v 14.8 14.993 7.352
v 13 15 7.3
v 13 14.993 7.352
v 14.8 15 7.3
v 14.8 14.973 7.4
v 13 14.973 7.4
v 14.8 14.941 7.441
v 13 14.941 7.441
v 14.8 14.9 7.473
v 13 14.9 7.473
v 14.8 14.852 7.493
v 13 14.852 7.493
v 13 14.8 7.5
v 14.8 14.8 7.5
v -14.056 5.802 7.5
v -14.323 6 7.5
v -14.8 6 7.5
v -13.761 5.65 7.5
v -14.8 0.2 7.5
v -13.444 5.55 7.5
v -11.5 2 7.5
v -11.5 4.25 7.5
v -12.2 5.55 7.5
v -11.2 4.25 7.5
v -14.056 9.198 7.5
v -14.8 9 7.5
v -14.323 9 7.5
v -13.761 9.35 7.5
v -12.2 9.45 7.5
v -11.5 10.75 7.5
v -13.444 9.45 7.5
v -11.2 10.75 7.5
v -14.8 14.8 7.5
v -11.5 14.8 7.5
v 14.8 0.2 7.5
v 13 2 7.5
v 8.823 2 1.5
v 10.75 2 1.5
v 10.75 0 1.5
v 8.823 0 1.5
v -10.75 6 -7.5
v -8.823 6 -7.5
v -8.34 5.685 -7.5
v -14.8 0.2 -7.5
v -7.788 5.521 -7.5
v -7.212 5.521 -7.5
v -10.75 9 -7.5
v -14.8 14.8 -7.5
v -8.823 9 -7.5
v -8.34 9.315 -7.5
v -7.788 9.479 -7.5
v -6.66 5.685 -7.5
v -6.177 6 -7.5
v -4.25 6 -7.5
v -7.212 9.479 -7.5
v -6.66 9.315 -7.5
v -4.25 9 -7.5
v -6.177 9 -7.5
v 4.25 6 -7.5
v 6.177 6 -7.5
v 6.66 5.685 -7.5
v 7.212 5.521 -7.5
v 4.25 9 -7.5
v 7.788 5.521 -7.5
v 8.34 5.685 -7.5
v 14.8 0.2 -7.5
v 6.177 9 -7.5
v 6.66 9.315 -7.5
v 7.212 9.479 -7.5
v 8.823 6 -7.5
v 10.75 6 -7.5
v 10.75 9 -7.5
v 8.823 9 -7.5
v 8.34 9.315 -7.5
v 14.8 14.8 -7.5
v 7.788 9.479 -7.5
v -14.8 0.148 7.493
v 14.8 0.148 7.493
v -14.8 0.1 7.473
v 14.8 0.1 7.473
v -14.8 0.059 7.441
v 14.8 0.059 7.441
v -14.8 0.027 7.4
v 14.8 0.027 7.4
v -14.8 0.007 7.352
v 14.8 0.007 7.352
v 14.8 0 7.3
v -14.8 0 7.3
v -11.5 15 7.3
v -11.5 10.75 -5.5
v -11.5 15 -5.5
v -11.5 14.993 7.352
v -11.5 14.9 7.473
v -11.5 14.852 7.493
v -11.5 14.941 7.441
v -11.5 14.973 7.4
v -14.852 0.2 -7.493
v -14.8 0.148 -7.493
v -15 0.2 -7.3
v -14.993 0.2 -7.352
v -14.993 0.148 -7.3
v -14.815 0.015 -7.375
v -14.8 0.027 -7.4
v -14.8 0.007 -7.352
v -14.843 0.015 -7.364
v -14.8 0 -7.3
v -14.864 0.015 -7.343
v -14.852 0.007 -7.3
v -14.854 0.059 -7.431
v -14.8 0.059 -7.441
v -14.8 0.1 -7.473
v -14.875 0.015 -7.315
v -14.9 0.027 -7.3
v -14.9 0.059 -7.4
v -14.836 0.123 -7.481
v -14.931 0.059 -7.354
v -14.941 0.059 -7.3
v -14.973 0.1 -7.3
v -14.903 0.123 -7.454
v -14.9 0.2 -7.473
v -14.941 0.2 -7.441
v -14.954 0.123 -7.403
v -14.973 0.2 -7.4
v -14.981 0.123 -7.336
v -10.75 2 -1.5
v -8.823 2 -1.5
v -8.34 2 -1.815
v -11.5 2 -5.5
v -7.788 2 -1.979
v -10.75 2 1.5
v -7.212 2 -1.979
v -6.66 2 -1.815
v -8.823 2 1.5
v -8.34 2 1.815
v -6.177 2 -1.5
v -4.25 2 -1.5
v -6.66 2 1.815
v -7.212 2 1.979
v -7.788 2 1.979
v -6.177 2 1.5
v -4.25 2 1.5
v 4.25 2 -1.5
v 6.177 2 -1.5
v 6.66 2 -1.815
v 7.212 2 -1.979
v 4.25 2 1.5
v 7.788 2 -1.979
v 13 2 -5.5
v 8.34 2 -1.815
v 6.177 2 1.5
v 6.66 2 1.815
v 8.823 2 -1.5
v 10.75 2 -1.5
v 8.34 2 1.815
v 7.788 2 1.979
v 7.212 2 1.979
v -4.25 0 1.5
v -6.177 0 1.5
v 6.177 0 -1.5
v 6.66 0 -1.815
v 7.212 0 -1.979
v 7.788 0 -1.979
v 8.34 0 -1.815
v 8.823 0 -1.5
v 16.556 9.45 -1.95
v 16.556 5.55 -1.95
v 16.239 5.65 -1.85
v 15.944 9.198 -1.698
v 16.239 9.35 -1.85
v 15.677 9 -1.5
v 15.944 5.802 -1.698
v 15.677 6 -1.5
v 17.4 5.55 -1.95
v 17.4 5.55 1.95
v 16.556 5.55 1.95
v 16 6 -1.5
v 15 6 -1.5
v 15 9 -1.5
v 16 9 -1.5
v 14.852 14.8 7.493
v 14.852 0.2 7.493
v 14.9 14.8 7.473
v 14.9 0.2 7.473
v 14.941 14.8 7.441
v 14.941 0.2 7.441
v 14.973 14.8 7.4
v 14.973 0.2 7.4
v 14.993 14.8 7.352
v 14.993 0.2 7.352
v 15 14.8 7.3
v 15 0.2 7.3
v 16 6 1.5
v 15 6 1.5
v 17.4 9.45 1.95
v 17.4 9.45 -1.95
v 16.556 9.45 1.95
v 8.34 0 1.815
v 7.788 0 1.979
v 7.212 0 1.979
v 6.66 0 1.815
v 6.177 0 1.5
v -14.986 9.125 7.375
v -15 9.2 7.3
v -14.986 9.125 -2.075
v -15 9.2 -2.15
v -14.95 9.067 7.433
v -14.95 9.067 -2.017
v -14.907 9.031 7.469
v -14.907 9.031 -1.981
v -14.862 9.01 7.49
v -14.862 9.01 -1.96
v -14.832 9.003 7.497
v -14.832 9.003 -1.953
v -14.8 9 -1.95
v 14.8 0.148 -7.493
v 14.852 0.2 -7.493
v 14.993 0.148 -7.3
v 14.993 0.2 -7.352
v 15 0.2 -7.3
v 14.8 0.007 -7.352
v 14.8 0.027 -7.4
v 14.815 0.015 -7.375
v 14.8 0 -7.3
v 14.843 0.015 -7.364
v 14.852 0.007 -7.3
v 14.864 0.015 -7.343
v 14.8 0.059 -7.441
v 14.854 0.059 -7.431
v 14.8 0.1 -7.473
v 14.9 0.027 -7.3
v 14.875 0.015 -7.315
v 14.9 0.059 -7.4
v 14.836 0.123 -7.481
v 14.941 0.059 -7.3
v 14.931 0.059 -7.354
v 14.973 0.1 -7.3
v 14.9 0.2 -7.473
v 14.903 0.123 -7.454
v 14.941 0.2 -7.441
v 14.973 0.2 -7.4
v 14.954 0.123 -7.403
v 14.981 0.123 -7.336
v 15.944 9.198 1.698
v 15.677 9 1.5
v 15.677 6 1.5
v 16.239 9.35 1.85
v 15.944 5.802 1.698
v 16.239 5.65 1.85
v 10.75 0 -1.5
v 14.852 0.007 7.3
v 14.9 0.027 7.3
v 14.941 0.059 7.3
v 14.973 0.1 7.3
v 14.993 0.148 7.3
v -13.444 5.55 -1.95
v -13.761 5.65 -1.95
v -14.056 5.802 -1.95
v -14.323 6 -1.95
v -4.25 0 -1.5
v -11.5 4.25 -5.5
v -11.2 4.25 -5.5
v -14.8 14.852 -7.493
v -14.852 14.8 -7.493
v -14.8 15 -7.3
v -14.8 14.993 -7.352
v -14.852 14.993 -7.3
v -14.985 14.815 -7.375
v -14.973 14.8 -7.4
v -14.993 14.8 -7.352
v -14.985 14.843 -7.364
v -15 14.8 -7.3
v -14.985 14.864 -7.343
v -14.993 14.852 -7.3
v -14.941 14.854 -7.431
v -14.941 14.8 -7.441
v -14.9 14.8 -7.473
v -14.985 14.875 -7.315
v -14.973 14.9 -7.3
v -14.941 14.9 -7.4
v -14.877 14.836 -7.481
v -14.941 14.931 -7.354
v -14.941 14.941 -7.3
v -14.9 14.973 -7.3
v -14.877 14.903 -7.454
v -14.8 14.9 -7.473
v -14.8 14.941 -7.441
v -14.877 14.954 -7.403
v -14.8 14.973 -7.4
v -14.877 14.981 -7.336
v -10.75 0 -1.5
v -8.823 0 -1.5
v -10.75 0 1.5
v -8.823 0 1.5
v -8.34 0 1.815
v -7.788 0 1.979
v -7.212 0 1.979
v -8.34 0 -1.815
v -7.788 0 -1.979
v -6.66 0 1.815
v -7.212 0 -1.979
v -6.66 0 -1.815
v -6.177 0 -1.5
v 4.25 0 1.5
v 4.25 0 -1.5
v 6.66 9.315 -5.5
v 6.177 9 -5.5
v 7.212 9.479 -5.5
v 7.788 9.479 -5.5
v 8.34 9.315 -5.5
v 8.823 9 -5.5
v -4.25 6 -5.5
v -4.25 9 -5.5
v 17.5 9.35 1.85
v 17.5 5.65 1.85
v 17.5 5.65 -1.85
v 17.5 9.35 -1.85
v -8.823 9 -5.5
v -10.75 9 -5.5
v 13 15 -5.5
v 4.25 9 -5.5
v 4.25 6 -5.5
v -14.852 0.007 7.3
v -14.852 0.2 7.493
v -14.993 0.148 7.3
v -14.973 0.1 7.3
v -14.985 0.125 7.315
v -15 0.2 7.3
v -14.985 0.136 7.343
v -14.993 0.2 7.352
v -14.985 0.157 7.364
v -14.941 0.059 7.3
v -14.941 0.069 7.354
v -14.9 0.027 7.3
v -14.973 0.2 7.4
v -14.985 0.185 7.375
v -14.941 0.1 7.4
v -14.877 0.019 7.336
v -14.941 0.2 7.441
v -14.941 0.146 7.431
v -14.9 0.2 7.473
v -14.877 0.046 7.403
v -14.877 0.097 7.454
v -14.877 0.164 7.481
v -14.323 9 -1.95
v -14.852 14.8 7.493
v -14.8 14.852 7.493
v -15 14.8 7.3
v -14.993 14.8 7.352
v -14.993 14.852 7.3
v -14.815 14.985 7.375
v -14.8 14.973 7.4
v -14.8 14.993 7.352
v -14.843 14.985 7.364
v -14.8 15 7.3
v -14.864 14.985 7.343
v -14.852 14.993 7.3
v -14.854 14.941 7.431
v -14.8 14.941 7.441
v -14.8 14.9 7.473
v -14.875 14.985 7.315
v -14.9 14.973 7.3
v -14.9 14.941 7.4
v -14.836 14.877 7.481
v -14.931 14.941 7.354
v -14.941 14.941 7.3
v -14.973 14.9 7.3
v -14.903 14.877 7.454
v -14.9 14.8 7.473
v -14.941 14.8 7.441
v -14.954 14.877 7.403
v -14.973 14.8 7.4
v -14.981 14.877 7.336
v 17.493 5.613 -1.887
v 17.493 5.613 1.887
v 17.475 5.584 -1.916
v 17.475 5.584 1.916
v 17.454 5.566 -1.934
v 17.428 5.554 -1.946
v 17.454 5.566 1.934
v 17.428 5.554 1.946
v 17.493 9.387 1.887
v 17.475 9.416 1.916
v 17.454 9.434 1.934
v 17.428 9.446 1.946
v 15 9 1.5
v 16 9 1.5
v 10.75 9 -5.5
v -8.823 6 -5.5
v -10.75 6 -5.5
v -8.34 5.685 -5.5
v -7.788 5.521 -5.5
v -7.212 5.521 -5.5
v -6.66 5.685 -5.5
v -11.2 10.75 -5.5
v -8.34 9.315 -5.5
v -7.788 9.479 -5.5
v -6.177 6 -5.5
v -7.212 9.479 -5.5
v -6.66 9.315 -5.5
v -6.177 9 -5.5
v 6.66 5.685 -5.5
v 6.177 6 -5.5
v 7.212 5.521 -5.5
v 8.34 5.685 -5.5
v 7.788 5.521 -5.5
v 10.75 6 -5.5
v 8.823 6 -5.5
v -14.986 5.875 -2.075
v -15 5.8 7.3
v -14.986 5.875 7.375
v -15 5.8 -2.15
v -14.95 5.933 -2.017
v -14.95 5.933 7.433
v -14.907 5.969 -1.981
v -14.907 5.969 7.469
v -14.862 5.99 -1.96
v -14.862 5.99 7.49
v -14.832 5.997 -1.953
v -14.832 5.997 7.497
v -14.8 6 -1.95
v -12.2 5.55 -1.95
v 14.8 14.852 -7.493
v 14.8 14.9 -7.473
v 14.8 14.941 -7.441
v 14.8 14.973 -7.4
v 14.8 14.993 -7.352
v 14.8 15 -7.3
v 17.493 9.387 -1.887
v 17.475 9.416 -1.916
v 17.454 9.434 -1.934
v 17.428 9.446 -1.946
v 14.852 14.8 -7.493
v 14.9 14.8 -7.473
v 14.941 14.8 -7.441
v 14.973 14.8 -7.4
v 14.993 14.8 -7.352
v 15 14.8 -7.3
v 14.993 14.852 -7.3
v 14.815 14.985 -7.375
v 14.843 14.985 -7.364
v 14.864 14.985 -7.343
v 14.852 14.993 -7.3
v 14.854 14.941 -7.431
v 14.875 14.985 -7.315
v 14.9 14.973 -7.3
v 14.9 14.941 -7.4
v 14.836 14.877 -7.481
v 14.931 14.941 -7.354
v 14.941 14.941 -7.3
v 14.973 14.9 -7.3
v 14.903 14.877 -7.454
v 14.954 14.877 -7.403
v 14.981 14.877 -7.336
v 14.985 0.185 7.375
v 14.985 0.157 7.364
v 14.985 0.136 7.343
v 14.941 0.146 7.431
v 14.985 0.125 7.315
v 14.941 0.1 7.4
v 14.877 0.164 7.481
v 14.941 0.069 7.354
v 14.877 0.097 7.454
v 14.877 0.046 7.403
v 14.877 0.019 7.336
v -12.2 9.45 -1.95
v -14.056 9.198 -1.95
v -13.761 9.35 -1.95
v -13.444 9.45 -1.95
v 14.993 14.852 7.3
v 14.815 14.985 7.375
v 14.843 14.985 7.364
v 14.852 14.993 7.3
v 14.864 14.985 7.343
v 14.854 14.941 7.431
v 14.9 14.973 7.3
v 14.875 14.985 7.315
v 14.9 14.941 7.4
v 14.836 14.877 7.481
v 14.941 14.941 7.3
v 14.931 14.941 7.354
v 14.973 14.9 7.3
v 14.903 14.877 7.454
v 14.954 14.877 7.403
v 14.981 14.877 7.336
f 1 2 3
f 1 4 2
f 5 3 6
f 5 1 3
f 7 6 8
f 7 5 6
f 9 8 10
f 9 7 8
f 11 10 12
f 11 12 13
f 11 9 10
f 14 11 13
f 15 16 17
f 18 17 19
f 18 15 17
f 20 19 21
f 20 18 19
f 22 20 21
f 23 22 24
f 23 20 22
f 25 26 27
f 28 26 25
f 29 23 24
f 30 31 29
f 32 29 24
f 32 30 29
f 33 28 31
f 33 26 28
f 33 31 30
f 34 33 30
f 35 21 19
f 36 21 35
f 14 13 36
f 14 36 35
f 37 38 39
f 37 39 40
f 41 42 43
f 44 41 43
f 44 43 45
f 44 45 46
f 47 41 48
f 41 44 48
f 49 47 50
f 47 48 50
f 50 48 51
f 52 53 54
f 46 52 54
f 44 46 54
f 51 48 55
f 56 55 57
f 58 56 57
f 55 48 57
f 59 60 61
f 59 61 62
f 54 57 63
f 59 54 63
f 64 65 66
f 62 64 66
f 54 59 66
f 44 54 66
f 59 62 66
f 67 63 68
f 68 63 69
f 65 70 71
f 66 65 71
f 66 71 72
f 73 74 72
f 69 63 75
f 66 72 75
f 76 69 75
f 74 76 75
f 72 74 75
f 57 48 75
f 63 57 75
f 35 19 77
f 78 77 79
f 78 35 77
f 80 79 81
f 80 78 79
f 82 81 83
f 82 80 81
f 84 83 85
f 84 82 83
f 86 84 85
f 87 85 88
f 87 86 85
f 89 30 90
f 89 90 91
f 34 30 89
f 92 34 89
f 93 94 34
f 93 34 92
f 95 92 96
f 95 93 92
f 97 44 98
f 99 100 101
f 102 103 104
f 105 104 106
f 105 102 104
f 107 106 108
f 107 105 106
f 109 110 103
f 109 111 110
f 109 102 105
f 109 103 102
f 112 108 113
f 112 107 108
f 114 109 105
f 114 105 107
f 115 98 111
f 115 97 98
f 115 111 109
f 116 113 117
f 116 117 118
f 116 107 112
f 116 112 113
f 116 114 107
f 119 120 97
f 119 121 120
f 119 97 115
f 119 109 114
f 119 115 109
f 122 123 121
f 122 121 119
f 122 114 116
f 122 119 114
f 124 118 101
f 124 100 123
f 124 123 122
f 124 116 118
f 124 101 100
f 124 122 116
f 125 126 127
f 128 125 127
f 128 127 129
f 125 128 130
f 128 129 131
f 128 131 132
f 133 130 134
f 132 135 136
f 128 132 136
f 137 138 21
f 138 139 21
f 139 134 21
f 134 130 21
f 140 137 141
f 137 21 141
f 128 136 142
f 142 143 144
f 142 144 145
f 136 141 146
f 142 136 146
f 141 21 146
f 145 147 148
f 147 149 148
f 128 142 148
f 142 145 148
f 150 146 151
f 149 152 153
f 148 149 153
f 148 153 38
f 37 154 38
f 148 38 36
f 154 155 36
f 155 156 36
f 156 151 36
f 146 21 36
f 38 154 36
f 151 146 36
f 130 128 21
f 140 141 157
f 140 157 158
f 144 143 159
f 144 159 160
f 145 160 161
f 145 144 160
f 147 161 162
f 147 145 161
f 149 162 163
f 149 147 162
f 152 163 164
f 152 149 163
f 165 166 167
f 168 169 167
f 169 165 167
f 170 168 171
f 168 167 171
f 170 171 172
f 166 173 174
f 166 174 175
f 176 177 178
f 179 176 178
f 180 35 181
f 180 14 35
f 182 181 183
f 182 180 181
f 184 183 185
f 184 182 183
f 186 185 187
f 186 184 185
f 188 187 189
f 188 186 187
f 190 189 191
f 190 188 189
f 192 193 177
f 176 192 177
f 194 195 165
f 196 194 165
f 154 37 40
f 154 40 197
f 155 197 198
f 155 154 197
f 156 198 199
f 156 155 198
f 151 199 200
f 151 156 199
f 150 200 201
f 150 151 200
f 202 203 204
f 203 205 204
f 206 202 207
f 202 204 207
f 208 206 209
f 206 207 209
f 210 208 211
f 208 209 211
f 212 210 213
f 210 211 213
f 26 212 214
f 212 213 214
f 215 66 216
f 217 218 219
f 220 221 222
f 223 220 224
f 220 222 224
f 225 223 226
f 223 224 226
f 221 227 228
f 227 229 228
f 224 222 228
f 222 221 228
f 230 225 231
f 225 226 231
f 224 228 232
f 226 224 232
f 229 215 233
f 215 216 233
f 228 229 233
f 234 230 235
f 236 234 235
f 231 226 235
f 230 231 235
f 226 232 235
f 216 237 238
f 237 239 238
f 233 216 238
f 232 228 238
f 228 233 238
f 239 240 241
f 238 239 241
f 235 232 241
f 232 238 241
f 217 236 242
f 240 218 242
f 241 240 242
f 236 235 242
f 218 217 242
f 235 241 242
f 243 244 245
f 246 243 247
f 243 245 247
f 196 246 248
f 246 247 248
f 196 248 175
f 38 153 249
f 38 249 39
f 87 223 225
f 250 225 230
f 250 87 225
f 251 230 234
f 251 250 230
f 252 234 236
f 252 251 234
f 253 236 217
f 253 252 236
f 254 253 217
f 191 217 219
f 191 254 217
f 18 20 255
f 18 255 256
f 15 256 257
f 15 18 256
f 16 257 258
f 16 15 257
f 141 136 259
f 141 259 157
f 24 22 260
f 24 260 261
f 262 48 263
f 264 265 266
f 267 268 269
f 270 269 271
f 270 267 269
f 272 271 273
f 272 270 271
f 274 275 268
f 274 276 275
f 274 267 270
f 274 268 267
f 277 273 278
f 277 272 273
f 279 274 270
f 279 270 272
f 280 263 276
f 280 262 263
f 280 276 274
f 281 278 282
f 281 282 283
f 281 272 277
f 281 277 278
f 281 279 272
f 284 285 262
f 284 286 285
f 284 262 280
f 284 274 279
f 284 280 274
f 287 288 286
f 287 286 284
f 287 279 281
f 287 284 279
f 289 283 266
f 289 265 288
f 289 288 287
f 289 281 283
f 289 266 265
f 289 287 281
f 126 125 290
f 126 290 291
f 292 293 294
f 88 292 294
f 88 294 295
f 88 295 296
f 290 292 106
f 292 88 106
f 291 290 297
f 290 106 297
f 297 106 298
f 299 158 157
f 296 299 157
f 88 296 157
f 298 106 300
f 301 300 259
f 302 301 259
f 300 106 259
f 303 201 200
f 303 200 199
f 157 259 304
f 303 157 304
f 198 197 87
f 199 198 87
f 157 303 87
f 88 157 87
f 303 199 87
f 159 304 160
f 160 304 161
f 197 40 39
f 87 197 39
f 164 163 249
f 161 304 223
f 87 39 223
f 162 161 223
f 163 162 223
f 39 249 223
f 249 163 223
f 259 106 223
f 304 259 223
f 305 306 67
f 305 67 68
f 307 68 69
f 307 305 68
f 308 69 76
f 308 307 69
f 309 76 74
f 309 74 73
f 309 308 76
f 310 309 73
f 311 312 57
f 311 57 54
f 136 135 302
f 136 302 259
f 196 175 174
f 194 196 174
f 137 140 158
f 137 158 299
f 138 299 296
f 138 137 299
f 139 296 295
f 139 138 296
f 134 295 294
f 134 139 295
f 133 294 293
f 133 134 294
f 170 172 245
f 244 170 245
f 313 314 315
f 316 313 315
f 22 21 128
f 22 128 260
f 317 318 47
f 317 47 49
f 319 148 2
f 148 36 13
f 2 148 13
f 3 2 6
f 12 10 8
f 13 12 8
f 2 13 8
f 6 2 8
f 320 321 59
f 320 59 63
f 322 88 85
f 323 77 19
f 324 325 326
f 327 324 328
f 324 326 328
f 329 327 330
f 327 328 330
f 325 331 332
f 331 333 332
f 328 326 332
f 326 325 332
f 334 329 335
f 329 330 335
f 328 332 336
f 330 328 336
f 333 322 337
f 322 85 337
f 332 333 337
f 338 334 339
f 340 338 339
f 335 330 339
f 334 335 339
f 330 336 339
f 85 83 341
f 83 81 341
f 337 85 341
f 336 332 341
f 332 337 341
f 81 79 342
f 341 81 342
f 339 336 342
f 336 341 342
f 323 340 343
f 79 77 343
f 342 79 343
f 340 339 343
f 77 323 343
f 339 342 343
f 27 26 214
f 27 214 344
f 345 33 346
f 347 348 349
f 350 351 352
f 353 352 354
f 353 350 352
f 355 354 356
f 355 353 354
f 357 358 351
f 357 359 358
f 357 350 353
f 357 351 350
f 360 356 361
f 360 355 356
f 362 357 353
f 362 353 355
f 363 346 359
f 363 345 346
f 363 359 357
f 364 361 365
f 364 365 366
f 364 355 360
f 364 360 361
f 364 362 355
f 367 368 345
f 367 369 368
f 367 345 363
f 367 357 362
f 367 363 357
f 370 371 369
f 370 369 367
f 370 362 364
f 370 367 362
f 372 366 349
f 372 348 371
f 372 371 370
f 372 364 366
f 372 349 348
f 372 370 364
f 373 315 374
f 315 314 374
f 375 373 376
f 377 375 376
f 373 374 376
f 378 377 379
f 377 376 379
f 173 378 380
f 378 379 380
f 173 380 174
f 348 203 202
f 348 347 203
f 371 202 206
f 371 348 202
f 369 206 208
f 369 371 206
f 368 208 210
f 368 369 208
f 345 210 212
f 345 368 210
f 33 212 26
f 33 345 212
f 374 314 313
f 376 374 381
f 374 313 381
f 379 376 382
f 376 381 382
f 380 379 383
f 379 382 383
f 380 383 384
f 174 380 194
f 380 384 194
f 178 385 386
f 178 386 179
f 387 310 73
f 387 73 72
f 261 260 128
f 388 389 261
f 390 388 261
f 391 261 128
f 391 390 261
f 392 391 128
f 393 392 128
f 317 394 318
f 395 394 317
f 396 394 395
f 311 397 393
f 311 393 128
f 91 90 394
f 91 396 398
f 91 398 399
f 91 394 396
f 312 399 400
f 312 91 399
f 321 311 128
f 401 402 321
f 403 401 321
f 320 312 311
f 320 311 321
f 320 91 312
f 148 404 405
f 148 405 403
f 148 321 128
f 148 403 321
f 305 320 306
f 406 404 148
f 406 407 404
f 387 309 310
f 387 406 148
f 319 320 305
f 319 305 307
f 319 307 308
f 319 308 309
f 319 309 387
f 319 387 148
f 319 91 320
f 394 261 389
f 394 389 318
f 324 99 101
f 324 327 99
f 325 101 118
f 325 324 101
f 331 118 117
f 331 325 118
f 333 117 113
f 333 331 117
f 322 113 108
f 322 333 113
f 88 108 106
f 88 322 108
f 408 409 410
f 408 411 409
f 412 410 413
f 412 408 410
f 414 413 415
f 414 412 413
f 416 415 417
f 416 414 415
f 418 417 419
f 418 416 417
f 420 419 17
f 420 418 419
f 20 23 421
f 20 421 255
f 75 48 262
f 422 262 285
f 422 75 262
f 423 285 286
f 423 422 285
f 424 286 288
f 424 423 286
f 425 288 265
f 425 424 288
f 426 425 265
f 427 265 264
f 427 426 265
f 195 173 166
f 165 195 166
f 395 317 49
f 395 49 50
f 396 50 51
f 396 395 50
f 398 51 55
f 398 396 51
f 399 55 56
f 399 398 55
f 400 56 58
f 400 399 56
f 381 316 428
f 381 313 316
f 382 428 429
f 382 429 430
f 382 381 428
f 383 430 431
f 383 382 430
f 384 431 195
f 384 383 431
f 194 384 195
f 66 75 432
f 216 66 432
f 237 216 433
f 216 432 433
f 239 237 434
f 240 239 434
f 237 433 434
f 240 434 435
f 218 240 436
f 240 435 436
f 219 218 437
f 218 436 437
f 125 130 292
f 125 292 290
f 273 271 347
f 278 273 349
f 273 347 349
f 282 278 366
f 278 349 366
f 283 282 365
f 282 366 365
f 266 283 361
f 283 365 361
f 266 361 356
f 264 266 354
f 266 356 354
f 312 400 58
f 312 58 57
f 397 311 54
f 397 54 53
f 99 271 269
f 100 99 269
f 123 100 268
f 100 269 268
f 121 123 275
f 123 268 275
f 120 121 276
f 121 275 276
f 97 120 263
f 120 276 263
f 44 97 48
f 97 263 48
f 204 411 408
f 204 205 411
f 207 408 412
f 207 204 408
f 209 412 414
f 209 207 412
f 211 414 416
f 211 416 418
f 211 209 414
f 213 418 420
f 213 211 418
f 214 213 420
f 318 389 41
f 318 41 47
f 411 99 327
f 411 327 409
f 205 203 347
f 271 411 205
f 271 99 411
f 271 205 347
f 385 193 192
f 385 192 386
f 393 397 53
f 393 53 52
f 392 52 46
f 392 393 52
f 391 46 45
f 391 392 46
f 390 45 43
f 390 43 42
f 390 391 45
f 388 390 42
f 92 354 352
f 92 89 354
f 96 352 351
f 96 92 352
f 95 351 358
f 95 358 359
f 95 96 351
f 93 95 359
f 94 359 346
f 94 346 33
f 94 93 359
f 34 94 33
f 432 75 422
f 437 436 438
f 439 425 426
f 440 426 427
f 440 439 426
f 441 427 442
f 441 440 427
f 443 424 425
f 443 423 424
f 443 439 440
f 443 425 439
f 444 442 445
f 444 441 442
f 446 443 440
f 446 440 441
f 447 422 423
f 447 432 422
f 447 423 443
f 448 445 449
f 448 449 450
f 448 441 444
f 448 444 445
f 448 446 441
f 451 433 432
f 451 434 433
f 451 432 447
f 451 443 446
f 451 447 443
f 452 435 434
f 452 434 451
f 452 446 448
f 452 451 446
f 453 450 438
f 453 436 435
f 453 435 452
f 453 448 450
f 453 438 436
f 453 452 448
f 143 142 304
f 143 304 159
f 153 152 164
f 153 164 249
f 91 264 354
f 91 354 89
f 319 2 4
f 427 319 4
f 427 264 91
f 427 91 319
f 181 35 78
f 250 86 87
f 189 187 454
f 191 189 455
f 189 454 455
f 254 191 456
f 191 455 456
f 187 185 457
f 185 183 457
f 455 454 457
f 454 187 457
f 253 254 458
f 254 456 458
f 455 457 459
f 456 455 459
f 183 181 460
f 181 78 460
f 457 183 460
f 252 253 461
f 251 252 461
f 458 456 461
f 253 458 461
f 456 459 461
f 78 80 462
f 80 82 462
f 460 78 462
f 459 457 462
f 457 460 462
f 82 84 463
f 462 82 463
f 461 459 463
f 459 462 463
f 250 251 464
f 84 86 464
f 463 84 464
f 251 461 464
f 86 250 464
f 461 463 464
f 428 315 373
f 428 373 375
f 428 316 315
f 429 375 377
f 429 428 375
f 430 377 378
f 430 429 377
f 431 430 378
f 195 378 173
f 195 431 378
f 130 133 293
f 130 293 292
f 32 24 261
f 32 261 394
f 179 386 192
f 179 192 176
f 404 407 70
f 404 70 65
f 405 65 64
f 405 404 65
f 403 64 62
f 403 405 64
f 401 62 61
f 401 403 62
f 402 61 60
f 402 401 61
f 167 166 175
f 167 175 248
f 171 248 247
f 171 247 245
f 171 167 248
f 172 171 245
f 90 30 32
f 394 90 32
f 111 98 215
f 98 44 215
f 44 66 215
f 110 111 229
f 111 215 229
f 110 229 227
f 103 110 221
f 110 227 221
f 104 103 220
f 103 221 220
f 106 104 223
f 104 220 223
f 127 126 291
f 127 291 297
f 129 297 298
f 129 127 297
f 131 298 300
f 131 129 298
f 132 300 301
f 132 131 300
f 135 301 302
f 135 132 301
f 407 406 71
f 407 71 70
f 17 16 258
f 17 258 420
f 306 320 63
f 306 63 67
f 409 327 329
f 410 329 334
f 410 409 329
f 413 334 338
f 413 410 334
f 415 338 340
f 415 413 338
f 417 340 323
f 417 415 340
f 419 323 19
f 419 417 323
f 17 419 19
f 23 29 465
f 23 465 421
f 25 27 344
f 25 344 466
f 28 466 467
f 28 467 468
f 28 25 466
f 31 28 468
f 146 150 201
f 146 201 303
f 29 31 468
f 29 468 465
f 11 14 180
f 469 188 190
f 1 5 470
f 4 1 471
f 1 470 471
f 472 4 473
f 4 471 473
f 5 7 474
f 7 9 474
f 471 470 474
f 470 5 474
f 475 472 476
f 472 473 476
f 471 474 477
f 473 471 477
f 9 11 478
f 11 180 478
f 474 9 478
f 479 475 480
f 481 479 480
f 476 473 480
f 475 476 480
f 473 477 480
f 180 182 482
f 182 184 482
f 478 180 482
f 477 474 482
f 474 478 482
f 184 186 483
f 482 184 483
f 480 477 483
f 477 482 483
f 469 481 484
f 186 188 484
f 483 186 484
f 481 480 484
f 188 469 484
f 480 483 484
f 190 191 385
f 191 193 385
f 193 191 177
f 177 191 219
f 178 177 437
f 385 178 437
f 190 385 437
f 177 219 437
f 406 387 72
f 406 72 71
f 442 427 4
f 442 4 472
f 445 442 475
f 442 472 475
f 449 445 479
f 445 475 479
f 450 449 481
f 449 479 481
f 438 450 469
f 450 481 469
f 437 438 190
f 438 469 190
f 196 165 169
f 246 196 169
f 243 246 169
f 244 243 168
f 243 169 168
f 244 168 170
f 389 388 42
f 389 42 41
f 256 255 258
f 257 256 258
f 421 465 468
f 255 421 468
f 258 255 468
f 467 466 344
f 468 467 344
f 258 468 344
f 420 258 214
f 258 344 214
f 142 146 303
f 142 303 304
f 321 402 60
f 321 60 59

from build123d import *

# Parameters (mm, degrees)
EXTRUDE_1_DEPTH      = 7.5
EXTRUDE_1_DEPTH_BACK = 7.5
SKETCH_1_W           = 30
SKETCH_1_H           = 15
SKETCH_2_W           = 24.5
SKETCH_2_H           = 13
CUT_EXTRUDE_1_DEPTH  = 13
SKETCH_3_W           = 3
SKETCH_3_H           = 3
EXTRUDE_2_DEPTH      = 1
EXTRUDE_3_DEPTH      = 4
EXTRUDE_3_DEPTH_BACK = 1
CUT_EXTRUDE_START    = -3.9
CUT_EXTRUDE_2_DEPTH  = 3.9
CUT_EXTRUDE_3_DEPTH  = 9.45
CUT_EXTRUDE_4_DEPTH  = 2
EXTRUDE_4_REACH      = 29.5
SKETCH_8_W           = 0.3
SKETCH_8_H           = 6.5
CUT_EXTRUDE_5_DEPTH  = 2
FILLET_1_R           = 0.1
FILLET_2_R           = 0.2


with BuildPart() as part:
    # 草图1 → 凸台-拉伸1 (new, two sides: drawn at the far end of the back side and taken through both)
    with BuildSketch(Plane.XY.offset(-EXTRUDE_1_DEPTH_BACK)):
        with Locations((0, 7.5)):
            Rectangle(SKETCH_1_W, SKETCH_1_H)
    extrude(amount=EXTRUDE_1_DEPTH + EXTRUDE_1_DEPTH_BACK)

    # 草图2 → 切除-拉伸1 (cut)
    with BuildSketch(Plane.XY.offset(7.5)):
        with Locations((0.75, 8.5)):
            Rectangle(SKETCH_2_W, SKETCH_2_H)
    extrude(amount=-CUT_EXTRUDE_1_DEPTH, mode=Mode.SUBTRACT)

    # 草图3 → 凸台-拉伸2 (add)
    with BuildSketch(Plane(origin=(15, 0, 0), x_dir=(0, 0, -1), z_dir=(1, 0, 0))):
        with Locations((0, 7.5)):
            Rectangle(SKETCH_3_W, SKETCH_3_H)
    extrude(amount=EXTRUDE_2_DEPTH)

    # 草图6 → 切除-拉伸3 (cut)
    with BuildSketch(Plane.XY.offset(7.5)):
        with BuildLine():
            Line((-15, 9), (-14.322875656, 9))
            ThreePointArc((-14.322875656, 9), (-13.911838473, 9.280042303), (-13.444409721, 9.45))
            Line((-13.444409721, 9.45), (-12.2, 9.45))
            Line((-12.2, 9.45), (-12.2, 5.55))
            Line((-12.2, 5.55), (-13.444409721, 5.55))
            ThreePointArc((-13.444409721, 5.55), (-13.911838473, 5.719957697), (-14.322875656, 6))
            Line((-14.322875656, 6), (-15, 6))
            Line((-15, 6), (-15, 9))
        make_face()
    extrude(amount=-CUT_EXTRUDE_3_DEPTH, mode=Mode.SUBTRACT)

    # 草图7 → 切除-拉伸4 (cut)
    with BuildSketch(Plane.XY.offset(-5.5)):
        with BuildLine():
            Line((-6.177124344, 9), (-4.25, 9))
            Line((-4.25, 9), (-4.25, 6))
            Line((-4.25, 6), (-6.177124344, 6))
            ThreePointArc((-6.177124344, 6), (-7.5, 5.5), (-8.822875656, 6))
            Line((-8.822875656, 6), (-10.75, 6))
            Line((-10.75, 6), (-10.75, 9))
            Line((-10.75, 9), (-8.822875656, 9))
            ThreePointArc((-8.822875656, 9), (-7.5, 9.5), (-6.177124344, 9))
        make_face()
        with BuildLine():
            Line((4.25, 9), (6.177124344, 9))
            ThreePointArc((6.177124344, 9), (7.5, 9.5), (8.822875656, 9))
            Line((8.822875656, 9), (10.75, 9))
            Line((10.75, 9), (10.75, 6))
            Line((10.75, 6), (8.822875656, 6))
            ThreePointArc((8.822875656, 6), (7.5, 5.5), (6.177124344, 6))
            Line((6.177124344, 6), (4.25, 6))
            Line((4.25, 6), (4.25, 9))
        make_face()
    extrude(amount=-CUT_EXTRUDE_4_DEPTH, mode=Mode.SUBTRACT)

    # 草图8 → 凸台-拉伸4 (add, up to next)
    with BuildSketch(Plane.XY.offset(7.5), mode=Mode.PRIVATE) as extrude_4_sk1:
        with Locations((-11.35, 7.5)):
            Rectangle(SKETCH_8_W, SKETCH_8_H)
    extrude_4_tool1 = extrude(extrude_4_sk1.sketch, amount=-EXTRUDE_4_REACH, mode=Mode.PRIVATE) - part.part
    add(extrude_4_tool1.solids().sort_by_distance((-11.35, 7.5, 7.5))[0])

    # 草图9 → 切除-拉伸5 (cut)
    with BuildSketch(Plane(origin=(0, 2, 0), x_dir=(-1, 0, 0), z_dir=(0, 1, 0))):
        with BuildLine():
            Line((6.177124344, -1.5), (4.25, -1.5))
            Line((4.25, -1.5), (4.25, 1.5))
            Line((4.25, 1.5), (6.177124344, 1.5))
            ThreePointArc((6.177124344, 1.5), (7.5, 2), (8.822875656, 1.5))
            Line((8.822875656, 1.5), (10.75, 1.5))
            Line((10.75, 1.5), (10.75, -1.5))
            Line((10.75, -1.5), (8.822875656, -1.5))
            ThreePointArc((8.822875656, -1.5), (7.5, -2), (6.177124344, -1.5))
        make_face()
        with BuildLine():
            Line((-4.25, -1.5), (-6.177124344, -1.5))
            ThreePointArc((-6.177124344, -1.5), (-7.5, -2), (-8.822875656, -1.5))
            Line((-8.822875656, -1.5), (-10.75, -1.5))
            Line((-10.75, -1.5), (-10.75, 1.5))
            Line((-10.75, 1.5), (-8.822875656, 1.5))
            ThreePointArc((-8.822875656, 1.5), (-7.5, 2), (-6.177124344, 1.5))
            Line((-6.177124344, 1.5), (-4.25, 1.5))
            Line((-4.25, 1.5), (-4.25, -1.5))
        make_face()
    extrude(amount=-CUT_EXTRUDE_5_DEPTH, mode=Mode.SUBTRACT)

    # 圆角2
    fillet_2_edges = [part.edges().sort_by_distance(p)[0] for p in [
        (15, 7.5, -7.5),
        (-15, 12, 7.5),
        (0, 0, 7.5),
        (0, 15, -7.5),
        (15, 7.5, 7.5),
        (14, 15, 7.5),
        (-13.25, 15, 7.5),
        (-15, 7.5, -7.5),
        (0, 0, -7.5),
        (-15, 15, 0),
        (15, 15, 0),
        (15, 0, 0),
        (-15, 0, 0),
        (-15, 3, 7.5),
        (-15, 7.5, -1.95),
        (-15, 6, 2.775),
        (-15, 9, 2.775),
    ]]
    fillet(fillet_2_edges, radius=FILLET_2_R)


with BuildPart() as body_2:
    # 草图4 → 凸台-拉伸3 (new, two sides: drawn at the far end of the back side and taken through both)
    with BuildSketch(Plane(origin=(0, 6, 0), x_dir=(1, 0, 0), z_dir=(0, 1, 0)).offset(-EXTRUDE_3_DEPTH_BACK)):
        with BuildLine():
            Line((17.5, -1.95), (17.5, 1.95))
            Line((17.5, 1.95), (16.555590279, 1.95))
            ThreePointArc((16.555590279, 1.95), (16.088161527, 1.780042303), (15.677124344, 1.5))
            Line((15.677124344, 1.5), (15.677124344, -1.5))
            ThreePointArc((15.677124344, -1.5), (16.088161527, -1.780042303), (16.555590279, -1.95))
            Line((16.555590279, -1.95), (17.5, -1.95))
        make_face()
    extrude(amount=EXTRUDE_3_DEPTH + EXTRUDE_3_DEPTH_BACK)

    # 草图5 → 切除-拉伸2 (cut)
    with BuildSketch(Plane.XY.offset(1.95).offset(CUT_EXTRUDE_START)):
        with BuildLine():
            Line((17.5, 9.45), (16.555590279, 9.45))
            ThreePointArc((16.555590279, 9.45), (16.088161527, 9.280042303), (15.677124344, 9))
            Line((15.677124344, 9), (15.677124344, 10))
            Line((15.677124344, 10), (17.5, 10))
            Line((17.5, 10), (17.5, 9.45))
        make_face()
        with BuildLine():
            Line((15.677124344, 5), (17.5, 5))
            Line((17.5, 5), (17.5, 5.55))
            Line((17.5, 5.55), (16.555590279, 5.55))
            ThreePointArc((16.555590279, 5.55), (16.088161527, 5.719957697), (15.677124344, 6))
            Line((15.677124344, 6), (15.677124344, 5))
        make_face()
    extrude(amount=CUT_EXTRUDE_2_DEPTH, mode=Mode.SUBTRACT)

    # 圆角1
    fillet_1_edges = [body_2.edges().sort_by_distance(p)[0] for p in [
        (17.5, 7.5, 1.95),
        (17.5, 7.5, -1.95),
        (17.5, 9.45, 0),
        (17.5, 5.55, 0),
    ]]
    fillet(fillet_1_edges, radius=FILLET_1_R)


solid = Compound([part.part, body_2.part])
